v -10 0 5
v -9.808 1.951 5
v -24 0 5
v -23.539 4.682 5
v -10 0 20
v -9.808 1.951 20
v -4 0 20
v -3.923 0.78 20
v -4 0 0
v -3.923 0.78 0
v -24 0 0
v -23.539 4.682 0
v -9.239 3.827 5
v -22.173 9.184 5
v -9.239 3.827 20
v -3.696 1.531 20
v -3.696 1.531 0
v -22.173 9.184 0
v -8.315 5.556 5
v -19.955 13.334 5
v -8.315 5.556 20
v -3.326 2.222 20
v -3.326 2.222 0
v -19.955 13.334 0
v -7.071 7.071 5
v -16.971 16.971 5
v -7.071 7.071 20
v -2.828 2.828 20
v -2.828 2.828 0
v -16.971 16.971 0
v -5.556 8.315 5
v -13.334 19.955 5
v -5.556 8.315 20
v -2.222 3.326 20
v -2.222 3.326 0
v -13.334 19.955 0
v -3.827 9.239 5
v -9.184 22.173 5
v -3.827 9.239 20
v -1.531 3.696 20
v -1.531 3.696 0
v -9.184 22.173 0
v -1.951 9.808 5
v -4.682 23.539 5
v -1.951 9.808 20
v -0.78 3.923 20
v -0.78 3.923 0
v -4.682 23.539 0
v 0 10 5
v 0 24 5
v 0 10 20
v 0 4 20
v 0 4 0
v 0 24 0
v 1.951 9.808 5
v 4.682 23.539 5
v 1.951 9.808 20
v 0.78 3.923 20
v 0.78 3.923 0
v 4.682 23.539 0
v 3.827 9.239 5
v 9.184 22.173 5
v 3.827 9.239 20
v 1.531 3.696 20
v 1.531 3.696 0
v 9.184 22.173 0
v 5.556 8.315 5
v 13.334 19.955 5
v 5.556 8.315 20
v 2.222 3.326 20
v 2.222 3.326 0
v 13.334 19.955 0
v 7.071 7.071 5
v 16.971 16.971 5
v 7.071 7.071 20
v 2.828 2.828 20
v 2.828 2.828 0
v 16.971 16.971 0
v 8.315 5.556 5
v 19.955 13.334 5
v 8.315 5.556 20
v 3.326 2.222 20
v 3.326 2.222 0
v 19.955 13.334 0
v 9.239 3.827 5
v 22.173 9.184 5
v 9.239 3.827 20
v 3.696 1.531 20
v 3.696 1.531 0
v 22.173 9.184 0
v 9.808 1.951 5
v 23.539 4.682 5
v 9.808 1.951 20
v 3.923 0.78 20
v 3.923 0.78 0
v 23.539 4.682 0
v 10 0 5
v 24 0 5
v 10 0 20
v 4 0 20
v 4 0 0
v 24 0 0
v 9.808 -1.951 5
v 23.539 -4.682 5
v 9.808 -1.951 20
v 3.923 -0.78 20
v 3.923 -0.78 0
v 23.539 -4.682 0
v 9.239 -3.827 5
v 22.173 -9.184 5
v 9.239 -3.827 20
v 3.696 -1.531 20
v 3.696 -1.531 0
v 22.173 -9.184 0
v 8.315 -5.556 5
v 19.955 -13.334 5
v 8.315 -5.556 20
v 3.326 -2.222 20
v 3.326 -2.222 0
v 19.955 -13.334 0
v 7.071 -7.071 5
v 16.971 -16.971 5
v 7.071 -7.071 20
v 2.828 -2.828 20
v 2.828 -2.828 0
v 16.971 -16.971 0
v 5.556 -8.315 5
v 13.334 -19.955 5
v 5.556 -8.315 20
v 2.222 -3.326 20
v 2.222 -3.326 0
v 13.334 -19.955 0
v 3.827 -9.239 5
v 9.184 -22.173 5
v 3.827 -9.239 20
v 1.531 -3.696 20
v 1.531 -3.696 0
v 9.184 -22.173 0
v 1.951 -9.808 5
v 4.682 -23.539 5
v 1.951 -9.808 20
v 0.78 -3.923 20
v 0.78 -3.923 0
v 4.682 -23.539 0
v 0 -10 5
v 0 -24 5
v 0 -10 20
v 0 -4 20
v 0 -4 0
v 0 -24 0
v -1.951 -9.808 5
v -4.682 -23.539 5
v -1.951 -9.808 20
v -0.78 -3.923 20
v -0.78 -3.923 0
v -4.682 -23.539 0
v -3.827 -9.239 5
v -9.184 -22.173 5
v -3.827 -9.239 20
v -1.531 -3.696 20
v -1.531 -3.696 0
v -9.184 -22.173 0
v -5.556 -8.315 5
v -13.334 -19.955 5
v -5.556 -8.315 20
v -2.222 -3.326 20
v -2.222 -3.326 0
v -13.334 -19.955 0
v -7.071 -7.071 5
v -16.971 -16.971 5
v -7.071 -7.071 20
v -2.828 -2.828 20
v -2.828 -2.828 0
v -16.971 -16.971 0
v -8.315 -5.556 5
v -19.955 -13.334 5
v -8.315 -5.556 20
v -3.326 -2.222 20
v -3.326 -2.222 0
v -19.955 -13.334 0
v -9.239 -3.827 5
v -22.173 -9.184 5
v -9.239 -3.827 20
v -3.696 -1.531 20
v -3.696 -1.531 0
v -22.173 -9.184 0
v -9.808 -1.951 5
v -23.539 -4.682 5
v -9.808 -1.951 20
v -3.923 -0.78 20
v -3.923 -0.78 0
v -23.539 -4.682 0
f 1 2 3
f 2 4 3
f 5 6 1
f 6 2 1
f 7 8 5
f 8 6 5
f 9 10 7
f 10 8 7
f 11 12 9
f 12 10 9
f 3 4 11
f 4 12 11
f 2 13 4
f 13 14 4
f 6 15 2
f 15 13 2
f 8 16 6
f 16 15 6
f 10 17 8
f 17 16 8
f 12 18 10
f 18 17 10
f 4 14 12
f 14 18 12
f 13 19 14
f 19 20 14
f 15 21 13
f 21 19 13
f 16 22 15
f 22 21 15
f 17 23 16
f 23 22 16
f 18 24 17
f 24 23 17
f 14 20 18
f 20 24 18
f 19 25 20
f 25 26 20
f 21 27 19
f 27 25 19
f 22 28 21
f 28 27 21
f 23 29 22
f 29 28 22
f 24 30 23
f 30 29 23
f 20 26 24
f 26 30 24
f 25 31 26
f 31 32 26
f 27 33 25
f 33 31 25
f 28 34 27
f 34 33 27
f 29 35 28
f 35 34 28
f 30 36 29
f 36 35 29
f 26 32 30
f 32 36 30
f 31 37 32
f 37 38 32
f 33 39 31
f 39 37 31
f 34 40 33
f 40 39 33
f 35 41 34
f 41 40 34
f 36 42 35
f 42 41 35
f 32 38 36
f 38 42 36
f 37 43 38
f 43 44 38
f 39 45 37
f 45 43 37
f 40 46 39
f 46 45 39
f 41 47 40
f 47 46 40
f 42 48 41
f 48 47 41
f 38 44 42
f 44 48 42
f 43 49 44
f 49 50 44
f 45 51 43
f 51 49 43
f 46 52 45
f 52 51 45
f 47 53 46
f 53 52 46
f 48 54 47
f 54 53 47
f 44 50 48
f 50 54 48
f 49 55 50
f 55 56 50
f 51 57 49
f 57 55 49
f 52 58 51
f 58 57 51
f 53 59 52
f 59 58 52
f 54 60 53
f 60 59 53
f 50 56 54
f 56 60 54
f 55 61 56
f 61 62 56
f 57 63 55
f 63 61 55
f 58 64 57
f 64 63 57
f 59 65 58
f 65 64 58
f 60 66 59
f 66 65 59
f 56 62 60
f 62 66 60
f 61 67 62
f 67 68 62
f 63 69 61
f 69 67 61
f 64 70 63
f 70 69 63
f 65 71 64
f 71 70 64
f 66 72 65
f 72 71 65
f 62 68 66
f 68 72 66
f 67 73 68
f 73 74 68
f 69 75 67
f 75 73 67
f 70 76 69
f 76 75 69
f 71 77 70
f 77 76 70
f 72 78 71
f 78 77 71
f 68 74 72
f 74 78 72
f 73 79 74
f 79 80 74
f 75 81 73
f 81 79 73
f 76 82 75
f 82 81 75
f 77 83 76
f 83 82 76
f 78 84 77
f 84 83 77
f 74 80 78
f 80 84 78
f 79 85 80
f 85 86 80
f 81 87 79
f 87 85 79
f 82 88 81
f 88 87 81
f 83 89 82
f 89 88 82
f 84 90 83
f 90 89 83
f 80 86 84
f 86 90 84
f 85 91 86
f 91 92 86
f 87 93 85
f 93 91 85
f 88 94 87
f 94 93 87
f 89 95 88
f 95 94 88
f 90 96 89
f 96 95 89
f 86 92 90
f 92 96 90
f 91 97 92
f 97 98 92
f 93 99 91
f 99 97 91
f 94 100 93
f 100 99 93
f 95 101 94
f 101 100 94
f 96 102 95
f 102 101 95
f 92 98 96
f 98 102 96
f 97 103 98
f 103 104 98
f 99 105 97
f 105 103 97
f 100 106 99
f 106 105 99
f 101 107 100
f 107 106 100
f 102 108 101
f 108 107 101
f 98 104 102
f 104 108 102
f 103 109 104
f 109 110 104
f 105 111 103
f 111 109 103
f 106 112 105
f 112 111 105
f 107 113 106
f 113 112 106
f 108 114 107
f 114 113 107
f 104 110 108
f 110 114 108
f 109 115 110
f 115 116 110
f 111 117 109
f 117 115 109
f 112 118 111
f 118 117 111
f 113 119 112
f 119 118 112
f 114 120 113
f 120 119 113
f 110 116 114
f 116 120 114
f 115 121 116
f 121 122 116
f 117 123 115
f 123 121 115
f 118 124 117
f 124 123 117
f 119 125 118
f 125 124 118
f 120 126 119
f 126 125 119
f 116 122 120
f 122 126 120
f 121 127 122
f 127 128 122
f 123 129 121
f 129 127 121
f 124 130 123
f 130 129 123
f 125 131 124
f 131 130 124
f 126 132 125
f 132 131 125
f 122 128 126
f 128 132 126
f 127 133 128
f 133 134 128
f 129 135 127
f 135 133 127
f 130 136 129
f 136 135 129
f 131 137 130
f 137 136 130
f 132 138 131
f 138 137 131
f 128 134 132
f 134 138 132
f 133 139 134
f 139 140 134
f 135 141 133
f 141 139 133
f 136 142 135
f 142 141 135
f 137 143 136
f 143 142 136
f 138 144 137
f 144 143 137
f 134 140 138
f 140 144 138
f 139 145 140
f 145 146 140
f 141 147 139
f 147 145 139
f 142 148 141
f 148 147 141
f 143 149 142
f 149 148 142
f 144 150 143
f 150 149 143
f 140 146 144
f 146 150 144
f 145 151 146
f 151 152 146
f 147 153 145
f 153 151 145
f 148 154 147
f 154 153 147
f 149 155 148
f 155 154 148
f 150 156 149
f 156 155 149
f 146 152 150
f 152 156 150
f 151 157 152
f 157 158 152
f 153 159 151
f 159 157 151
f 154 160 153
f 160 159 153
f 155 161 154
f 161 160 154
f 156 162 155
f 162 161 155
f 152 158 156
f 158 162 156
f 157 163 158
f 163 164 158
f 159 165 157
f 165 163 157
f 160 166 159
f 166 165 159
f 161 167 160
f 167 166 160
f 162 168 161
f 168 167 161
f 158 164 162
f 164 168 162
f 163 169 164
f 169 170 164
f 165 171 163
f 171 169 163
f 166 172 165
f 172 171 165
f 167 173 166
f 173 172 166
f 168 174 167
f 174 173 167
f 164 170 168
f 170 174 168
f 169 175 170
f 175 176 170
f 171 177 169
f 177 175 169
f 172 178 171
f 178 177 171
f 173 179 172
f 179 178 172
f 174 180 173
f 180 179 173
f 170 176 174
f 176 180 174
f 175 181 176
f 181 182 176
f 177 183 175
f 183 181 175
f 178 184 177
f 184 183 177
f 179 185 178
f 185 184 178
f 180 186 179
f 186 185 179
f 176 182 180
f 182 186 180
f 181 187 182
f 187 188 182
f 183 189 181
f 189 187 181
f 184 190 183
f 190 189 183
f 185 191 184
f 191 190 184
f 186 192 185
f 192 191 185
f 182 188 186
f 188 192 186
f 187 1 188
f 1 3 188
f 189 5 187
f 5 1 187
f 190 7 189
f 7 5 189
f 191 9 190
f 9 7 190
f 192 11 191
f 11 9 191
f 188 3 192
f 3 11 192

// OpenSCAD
$fn = 32;

// ----------------------------------------------------------------------
// Revolved part: flanged bushing R24
// ----------------------------------------------------------------------

// --- parameters (mm) ---
bore_r = 4;               // bore radius
flange_r = 24;            // flange radius
flange_h = 5;             // flange thickness
sleeve_r = 10;            // sleeve radius
total_h = 20;             // overall height
revolve_angle = 360;      // revolve sweep, degrees
fit_tol = 0.02;           // declared fit tolerance (prompt contract)
free_tol = 0.2;           // declared free tolerance (prompt contract)

bore_d = 2 * bore_r;
flange_d = 2 * flange_r;
sleeve_d = 2 * sleeve_r;

profile = [[4, 0], [24, 0], [24, 5], [10, 5], [10, 20], [4, 20]];  // primary outline, 6 points, counter clockwise

// --- the one profile operation ---
rotate_extrude(angle = revolve_angle) polygon(points = profile);
